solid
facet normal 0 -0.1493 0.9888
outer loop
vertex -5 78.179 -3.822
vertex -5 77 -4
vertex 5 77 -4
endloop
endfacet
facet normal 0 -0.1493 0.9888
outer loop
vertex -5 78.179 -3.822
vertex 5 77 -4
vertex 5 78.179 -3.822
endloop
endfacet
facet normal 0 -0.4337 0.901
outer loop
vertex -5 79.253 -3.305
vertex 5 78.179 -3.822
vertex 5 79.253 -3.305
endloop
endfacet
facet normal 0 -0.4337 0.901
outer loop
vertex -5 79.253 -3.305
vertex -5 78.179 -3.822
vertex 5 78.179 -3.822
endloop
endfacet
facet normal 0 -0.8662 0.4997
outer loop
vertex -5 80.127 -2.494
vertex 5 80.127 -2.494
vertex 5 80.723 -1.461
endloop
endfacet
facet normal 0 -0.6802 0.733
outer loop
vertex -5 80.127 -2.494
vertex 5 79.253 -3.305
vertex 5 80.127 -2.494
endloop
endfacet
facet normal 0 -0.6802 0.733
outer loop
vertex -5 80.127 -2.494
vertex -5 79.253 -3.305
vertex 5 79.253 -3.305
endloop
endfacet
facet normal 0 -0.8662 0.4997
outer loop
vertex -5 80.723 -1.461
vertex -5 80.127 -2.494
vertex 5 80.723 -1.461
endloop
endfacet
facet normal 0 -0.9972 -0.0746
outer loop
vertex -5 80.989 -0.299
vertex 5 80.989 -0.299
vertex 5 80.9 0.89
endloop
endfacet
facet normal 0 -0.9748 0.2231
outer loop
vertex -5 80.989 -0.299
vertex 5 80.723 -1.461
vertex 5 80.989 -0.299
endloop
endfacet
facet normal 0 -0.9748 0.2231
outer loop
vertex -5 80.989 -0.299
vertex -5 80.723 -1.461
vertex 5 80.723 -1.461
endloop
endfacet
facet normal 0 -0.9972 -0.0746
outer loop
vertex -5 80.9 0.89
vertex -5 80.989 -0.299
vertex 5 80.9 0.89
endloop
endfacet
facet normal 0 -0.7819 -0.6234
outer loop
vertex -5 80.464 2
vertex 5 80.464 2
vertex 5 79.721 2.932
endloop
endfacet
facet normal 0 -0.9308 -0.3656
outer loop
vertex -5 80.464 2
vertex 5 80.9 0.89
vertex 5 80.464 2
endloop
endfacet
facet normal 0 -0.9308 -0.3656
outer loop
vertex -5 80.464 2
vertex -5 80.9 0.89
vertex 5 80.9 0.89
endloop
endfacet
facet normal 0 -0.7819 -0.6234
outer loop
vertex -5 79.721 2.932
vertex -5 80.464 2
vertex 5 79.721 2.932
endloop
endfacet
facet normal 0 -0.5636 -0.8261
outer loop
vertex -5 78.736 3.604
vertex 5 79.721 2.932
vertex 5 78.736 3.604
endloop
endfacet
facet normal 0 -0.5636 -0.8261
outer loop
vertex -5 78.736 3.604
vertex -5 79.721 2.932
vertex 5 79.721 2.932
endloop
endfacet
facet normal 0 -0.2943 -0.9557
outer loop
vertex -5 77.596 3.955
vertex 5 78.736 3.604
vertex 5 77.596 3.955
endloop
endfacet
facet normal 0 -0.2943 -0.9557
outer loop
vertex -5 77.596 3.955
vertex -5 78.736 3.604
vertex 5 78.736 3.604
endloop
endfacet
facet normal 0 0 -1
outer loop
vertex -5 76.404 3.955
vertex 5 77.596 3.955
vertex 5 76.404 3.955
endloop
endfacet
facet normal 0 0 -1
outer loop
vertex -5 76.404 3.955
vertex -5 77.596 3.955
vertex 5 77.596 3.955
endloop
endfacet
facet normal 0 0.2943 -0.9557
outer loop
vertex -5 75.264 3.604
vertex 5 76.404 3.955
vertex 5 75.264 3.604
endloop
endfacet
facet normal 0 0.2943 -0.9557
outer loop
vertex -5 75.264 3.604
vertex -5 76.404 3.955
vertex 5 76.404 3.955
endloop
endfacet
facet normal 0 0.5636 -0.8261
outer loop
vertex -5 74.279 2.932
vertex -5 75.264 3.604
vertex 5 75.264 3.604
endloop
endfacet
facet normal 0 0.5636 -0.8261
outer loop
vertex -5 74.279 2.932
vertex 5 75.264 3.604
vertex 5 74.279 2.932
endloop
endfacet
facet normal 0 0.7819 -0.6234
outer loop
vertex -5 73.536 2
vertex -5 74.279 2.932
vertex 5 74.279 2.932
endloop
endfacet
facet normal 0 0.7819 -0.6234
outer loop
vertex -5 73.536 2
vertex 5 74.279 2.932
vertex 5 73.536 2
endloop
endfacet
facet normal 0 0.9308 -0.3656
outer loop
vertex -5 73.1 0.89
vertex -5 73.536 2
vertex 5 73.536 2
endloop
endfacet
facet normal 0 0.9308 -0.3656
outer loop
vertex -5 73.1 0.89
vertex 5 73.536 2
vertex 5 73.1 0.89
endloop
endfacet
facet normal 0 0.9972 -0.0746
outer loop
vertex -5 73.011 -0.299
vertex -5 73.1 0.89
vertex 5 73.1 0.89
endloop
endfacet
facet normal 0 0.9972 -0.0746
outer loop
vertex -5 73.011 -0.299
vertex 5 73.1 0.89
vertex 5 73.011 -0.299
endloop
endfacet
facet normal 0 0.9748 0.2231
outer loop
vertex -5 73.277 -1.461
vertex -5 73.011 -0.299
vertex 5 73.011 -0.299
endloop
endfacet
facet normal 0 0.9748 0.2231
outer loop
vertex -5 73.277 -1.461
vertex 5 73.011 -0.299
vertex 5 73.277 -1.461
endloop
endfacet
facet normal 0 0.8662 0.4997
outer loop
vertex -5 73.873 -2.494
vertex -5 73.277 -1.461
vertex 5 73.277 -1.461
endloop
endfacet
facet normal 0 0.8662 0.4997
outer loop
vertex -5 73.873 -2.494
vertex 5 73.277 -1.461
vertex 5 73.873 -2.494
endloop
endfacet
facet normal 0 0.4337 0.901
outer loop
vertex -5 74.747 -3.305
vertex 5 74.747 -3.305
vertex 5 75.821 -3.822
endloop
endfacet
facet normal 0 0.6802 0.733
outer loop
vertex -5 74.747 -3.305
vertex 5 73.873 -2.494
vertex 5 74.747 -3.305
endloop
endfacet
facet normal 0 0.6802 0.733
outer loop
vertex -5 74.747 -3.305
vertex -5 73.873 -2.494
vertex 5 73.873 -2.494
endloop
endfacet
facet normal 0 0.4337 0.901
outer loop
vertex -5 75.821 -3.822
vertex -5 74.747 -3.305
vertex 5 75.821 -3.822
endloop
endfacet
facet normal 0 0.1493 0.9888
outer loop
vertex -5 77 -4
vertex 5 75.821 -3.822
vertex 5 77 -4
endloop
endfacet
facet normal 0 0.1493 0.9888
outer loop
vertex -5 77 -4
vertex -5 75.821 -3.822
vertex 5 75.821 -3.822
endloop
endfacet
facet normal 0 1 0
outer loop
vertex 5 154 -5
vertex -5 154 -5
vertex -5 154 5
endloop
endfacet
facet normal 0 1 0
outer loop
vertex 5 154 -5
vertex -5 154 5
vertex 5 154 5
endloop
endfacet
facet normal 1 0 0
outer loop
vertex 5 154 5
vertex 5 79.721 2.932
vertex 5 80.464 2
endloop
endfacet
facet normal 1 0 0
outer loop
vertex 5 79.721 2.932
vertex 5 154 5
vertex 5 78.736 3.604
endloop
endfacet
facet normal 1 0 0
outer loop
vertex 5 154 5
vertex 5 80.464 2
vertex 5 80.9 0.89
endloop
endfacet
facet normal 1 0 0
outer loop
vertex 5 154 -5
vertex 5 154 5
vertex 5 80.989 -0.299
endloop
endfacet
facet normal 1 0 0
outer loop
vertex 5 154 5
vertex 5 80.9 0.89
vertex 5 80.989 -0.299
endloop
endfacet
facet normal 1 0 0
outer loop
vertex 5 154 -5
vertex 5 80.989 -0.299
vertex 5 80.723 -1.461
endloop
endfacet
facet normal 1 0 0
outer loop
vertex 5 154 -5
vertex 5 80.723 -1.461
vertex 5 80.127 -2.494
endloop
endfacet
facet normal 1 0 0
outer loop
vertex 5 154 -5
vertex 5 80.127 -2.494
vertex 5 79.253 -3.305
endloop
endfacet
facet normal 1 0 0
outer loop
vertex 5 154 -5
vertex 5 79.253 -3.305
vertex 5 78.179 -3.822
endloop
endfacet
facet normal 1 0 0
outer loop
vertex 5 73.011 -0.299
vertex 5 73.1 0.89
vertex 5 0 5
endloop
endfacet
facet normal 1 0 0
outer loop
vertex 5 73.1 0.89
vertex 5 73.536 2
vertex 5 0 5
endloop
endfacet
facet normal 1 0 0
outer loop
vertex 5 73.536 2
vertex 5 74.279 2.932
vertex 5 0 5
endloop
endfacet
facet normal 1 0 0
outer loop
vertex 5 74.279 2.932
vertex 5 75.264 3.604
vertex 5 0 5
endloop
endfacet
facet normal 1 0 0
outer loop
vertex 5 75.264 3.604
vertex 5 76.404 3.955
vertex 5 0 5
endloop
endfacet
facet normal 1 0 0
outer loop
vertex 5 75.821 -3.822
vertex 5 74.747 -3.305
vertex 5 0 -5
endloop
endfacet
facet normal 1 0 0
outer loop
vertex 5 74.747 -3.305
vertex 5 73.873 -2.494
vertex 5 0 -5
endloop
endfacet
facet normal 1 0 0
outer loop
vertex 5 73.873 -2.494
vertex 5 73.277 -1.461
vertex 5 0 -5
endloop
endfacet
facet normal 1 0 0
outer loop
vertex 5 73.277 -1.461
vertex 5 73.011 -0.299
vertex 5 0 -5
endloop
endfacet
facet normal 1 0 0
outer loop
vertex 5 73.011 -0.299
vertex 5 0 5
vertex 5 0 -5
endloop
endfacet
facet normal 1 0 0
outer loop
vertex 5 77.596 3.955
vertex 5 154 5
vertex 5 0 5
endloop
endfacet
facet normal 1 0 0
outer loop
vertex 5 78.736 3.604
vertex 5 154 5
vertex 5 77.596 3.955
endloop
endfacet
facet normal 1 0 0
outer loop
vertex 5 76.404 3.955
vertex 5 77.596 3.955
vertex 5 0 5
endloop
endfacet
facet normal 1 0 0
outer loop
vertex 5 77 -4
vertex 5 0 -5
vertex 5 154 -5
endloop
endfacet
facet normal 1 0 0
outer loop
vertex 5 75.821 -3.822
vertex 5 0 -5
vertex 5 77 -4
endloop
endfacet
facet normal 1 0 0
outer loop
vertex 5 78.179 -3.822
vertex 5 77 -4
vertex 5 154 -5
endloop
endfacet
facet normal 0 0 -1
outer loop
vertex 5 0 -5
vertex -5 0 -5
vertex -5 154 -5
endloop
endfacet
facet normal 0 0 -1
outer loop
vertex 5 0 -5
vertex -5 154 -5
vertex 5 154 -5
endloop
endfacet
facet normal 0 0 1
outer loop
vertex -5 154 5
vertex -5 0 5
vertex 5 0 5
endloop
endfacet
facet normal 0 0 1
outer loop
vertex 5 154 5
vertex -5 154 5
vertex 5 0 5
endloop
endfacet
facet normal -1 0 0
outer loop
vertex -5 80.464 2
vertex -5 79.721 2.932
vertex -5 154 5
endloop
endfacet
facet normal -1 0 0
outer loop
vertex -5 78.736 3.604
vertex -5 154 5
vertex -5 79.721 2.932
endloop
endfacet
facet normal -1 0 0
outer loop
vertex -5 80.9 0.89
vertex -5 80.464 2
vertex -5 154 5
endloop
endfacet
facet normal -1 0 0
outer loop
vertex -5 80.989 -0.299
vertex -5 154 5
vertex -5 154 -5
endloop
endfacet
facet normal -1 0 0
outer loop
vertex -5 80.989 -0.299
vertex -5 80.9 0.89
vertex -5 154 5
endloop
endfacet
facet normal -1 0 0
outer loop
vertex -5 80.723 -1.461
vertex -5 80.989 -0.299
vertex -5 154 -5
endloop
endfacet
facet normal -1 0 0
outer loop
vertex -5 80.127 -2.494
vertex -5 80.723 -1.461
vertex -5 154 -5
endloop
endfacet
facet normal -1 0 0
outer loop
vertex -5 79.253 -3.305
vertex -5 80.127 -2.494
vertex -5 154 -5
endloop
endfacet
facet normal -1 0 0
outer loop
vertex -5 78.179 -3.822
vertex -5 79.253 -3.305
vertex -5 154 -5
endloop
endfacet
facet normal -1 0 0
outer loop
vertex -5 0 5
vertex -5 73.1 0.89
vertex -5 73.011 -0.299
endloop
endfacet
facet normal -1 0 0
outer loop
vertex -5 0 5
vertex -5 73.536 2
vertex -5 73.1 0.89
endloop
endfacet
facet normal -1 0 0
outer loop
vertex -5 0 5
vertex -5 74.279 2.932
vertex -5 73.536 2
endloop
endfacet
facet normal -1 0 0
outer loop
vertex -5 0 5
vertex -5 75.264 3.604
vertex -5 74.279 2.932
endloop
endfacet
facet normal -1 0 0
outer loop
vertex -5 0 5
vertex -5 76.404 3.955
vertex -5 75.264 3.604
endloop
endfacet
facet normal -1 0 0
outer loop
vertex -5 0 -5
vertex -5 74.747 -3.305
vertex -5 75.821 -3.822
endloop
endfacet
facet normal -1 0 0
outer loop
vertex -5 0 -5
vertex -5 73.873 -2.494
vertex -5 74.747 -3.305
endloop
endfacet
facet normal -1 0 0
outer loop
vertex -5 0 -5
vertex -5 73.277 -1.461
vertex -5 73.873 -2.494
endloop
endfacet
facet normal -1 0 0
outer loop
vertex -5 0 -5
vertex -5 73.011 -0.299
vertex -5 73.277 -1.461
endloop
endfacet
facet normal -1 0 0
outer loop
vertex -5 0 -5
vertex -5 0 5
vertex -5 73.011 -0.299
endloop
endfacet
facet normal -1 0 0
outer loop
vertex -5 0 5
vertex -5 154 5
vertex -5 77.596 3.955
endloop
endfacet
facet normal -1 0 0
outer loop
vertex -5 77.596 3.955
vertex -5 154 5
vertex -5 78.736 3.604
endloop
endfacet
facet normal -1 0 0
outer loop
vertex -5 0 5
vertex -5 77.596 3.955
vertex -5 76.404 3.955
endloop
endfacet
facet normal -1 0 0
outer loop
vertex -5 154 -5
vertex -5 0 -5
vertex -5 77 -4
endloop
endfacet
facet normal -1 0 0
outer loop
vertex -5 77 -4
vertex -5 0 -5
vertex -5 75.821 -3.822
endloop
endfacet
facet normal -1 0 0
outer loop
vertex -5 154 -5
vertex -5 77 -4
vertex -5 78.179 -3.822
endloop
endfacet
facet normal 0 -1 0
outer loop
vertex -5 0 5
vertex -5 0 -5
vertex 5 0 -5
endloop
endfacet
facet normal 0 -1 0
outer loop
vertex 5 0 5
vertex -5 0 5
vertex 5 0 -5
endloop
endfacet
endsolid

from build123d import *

# Parameters (mm, degrees)
SKETCH1_W               = 10
SKETCH1_H               = 10
BOSS_EXTRUDE1_DEPTH     = 154
CUT_EXTRUDE1_DEPTH      = 155.405310789
CUT_EXTRUDE1_DEPTH_BACK = 155.405310789
SKETCH2_R               = 4


with BuildPart() as part:
    # Sketch1 → Boss-Extrude1 (new body)
    with BuildSketch(Plane(origin=(0, 0, 0), x_dir=(1, 0, 0), z_dir=(0, 1, 0))):
        Rectangle(SKETCH1_W, SKETCH1_H)
    extrude(amount=BOSS_EXTRUDE1_DEPTH)

    # Sketch2 → Cut-Extrude1 (cut, two sides: drawn at the far end of the back side and taken through both)
    with BuildSketch(Plane(origin=(5, 0, 0), x_dir=(0, 0, -1), z_dir=(1, 0, 0)).offset(-CUT_EXTRUDE1_DEPTH_BACK)):
        with Locations((0, 77)):
            Circle(SKETCH2_R)
    extrude(amount=CUT_EXTRUDE1_DEPTH + CUT_EXTRUDE1_DEPTH_BACK, mode=Mode.SUBTRACT)


solid = part.part
